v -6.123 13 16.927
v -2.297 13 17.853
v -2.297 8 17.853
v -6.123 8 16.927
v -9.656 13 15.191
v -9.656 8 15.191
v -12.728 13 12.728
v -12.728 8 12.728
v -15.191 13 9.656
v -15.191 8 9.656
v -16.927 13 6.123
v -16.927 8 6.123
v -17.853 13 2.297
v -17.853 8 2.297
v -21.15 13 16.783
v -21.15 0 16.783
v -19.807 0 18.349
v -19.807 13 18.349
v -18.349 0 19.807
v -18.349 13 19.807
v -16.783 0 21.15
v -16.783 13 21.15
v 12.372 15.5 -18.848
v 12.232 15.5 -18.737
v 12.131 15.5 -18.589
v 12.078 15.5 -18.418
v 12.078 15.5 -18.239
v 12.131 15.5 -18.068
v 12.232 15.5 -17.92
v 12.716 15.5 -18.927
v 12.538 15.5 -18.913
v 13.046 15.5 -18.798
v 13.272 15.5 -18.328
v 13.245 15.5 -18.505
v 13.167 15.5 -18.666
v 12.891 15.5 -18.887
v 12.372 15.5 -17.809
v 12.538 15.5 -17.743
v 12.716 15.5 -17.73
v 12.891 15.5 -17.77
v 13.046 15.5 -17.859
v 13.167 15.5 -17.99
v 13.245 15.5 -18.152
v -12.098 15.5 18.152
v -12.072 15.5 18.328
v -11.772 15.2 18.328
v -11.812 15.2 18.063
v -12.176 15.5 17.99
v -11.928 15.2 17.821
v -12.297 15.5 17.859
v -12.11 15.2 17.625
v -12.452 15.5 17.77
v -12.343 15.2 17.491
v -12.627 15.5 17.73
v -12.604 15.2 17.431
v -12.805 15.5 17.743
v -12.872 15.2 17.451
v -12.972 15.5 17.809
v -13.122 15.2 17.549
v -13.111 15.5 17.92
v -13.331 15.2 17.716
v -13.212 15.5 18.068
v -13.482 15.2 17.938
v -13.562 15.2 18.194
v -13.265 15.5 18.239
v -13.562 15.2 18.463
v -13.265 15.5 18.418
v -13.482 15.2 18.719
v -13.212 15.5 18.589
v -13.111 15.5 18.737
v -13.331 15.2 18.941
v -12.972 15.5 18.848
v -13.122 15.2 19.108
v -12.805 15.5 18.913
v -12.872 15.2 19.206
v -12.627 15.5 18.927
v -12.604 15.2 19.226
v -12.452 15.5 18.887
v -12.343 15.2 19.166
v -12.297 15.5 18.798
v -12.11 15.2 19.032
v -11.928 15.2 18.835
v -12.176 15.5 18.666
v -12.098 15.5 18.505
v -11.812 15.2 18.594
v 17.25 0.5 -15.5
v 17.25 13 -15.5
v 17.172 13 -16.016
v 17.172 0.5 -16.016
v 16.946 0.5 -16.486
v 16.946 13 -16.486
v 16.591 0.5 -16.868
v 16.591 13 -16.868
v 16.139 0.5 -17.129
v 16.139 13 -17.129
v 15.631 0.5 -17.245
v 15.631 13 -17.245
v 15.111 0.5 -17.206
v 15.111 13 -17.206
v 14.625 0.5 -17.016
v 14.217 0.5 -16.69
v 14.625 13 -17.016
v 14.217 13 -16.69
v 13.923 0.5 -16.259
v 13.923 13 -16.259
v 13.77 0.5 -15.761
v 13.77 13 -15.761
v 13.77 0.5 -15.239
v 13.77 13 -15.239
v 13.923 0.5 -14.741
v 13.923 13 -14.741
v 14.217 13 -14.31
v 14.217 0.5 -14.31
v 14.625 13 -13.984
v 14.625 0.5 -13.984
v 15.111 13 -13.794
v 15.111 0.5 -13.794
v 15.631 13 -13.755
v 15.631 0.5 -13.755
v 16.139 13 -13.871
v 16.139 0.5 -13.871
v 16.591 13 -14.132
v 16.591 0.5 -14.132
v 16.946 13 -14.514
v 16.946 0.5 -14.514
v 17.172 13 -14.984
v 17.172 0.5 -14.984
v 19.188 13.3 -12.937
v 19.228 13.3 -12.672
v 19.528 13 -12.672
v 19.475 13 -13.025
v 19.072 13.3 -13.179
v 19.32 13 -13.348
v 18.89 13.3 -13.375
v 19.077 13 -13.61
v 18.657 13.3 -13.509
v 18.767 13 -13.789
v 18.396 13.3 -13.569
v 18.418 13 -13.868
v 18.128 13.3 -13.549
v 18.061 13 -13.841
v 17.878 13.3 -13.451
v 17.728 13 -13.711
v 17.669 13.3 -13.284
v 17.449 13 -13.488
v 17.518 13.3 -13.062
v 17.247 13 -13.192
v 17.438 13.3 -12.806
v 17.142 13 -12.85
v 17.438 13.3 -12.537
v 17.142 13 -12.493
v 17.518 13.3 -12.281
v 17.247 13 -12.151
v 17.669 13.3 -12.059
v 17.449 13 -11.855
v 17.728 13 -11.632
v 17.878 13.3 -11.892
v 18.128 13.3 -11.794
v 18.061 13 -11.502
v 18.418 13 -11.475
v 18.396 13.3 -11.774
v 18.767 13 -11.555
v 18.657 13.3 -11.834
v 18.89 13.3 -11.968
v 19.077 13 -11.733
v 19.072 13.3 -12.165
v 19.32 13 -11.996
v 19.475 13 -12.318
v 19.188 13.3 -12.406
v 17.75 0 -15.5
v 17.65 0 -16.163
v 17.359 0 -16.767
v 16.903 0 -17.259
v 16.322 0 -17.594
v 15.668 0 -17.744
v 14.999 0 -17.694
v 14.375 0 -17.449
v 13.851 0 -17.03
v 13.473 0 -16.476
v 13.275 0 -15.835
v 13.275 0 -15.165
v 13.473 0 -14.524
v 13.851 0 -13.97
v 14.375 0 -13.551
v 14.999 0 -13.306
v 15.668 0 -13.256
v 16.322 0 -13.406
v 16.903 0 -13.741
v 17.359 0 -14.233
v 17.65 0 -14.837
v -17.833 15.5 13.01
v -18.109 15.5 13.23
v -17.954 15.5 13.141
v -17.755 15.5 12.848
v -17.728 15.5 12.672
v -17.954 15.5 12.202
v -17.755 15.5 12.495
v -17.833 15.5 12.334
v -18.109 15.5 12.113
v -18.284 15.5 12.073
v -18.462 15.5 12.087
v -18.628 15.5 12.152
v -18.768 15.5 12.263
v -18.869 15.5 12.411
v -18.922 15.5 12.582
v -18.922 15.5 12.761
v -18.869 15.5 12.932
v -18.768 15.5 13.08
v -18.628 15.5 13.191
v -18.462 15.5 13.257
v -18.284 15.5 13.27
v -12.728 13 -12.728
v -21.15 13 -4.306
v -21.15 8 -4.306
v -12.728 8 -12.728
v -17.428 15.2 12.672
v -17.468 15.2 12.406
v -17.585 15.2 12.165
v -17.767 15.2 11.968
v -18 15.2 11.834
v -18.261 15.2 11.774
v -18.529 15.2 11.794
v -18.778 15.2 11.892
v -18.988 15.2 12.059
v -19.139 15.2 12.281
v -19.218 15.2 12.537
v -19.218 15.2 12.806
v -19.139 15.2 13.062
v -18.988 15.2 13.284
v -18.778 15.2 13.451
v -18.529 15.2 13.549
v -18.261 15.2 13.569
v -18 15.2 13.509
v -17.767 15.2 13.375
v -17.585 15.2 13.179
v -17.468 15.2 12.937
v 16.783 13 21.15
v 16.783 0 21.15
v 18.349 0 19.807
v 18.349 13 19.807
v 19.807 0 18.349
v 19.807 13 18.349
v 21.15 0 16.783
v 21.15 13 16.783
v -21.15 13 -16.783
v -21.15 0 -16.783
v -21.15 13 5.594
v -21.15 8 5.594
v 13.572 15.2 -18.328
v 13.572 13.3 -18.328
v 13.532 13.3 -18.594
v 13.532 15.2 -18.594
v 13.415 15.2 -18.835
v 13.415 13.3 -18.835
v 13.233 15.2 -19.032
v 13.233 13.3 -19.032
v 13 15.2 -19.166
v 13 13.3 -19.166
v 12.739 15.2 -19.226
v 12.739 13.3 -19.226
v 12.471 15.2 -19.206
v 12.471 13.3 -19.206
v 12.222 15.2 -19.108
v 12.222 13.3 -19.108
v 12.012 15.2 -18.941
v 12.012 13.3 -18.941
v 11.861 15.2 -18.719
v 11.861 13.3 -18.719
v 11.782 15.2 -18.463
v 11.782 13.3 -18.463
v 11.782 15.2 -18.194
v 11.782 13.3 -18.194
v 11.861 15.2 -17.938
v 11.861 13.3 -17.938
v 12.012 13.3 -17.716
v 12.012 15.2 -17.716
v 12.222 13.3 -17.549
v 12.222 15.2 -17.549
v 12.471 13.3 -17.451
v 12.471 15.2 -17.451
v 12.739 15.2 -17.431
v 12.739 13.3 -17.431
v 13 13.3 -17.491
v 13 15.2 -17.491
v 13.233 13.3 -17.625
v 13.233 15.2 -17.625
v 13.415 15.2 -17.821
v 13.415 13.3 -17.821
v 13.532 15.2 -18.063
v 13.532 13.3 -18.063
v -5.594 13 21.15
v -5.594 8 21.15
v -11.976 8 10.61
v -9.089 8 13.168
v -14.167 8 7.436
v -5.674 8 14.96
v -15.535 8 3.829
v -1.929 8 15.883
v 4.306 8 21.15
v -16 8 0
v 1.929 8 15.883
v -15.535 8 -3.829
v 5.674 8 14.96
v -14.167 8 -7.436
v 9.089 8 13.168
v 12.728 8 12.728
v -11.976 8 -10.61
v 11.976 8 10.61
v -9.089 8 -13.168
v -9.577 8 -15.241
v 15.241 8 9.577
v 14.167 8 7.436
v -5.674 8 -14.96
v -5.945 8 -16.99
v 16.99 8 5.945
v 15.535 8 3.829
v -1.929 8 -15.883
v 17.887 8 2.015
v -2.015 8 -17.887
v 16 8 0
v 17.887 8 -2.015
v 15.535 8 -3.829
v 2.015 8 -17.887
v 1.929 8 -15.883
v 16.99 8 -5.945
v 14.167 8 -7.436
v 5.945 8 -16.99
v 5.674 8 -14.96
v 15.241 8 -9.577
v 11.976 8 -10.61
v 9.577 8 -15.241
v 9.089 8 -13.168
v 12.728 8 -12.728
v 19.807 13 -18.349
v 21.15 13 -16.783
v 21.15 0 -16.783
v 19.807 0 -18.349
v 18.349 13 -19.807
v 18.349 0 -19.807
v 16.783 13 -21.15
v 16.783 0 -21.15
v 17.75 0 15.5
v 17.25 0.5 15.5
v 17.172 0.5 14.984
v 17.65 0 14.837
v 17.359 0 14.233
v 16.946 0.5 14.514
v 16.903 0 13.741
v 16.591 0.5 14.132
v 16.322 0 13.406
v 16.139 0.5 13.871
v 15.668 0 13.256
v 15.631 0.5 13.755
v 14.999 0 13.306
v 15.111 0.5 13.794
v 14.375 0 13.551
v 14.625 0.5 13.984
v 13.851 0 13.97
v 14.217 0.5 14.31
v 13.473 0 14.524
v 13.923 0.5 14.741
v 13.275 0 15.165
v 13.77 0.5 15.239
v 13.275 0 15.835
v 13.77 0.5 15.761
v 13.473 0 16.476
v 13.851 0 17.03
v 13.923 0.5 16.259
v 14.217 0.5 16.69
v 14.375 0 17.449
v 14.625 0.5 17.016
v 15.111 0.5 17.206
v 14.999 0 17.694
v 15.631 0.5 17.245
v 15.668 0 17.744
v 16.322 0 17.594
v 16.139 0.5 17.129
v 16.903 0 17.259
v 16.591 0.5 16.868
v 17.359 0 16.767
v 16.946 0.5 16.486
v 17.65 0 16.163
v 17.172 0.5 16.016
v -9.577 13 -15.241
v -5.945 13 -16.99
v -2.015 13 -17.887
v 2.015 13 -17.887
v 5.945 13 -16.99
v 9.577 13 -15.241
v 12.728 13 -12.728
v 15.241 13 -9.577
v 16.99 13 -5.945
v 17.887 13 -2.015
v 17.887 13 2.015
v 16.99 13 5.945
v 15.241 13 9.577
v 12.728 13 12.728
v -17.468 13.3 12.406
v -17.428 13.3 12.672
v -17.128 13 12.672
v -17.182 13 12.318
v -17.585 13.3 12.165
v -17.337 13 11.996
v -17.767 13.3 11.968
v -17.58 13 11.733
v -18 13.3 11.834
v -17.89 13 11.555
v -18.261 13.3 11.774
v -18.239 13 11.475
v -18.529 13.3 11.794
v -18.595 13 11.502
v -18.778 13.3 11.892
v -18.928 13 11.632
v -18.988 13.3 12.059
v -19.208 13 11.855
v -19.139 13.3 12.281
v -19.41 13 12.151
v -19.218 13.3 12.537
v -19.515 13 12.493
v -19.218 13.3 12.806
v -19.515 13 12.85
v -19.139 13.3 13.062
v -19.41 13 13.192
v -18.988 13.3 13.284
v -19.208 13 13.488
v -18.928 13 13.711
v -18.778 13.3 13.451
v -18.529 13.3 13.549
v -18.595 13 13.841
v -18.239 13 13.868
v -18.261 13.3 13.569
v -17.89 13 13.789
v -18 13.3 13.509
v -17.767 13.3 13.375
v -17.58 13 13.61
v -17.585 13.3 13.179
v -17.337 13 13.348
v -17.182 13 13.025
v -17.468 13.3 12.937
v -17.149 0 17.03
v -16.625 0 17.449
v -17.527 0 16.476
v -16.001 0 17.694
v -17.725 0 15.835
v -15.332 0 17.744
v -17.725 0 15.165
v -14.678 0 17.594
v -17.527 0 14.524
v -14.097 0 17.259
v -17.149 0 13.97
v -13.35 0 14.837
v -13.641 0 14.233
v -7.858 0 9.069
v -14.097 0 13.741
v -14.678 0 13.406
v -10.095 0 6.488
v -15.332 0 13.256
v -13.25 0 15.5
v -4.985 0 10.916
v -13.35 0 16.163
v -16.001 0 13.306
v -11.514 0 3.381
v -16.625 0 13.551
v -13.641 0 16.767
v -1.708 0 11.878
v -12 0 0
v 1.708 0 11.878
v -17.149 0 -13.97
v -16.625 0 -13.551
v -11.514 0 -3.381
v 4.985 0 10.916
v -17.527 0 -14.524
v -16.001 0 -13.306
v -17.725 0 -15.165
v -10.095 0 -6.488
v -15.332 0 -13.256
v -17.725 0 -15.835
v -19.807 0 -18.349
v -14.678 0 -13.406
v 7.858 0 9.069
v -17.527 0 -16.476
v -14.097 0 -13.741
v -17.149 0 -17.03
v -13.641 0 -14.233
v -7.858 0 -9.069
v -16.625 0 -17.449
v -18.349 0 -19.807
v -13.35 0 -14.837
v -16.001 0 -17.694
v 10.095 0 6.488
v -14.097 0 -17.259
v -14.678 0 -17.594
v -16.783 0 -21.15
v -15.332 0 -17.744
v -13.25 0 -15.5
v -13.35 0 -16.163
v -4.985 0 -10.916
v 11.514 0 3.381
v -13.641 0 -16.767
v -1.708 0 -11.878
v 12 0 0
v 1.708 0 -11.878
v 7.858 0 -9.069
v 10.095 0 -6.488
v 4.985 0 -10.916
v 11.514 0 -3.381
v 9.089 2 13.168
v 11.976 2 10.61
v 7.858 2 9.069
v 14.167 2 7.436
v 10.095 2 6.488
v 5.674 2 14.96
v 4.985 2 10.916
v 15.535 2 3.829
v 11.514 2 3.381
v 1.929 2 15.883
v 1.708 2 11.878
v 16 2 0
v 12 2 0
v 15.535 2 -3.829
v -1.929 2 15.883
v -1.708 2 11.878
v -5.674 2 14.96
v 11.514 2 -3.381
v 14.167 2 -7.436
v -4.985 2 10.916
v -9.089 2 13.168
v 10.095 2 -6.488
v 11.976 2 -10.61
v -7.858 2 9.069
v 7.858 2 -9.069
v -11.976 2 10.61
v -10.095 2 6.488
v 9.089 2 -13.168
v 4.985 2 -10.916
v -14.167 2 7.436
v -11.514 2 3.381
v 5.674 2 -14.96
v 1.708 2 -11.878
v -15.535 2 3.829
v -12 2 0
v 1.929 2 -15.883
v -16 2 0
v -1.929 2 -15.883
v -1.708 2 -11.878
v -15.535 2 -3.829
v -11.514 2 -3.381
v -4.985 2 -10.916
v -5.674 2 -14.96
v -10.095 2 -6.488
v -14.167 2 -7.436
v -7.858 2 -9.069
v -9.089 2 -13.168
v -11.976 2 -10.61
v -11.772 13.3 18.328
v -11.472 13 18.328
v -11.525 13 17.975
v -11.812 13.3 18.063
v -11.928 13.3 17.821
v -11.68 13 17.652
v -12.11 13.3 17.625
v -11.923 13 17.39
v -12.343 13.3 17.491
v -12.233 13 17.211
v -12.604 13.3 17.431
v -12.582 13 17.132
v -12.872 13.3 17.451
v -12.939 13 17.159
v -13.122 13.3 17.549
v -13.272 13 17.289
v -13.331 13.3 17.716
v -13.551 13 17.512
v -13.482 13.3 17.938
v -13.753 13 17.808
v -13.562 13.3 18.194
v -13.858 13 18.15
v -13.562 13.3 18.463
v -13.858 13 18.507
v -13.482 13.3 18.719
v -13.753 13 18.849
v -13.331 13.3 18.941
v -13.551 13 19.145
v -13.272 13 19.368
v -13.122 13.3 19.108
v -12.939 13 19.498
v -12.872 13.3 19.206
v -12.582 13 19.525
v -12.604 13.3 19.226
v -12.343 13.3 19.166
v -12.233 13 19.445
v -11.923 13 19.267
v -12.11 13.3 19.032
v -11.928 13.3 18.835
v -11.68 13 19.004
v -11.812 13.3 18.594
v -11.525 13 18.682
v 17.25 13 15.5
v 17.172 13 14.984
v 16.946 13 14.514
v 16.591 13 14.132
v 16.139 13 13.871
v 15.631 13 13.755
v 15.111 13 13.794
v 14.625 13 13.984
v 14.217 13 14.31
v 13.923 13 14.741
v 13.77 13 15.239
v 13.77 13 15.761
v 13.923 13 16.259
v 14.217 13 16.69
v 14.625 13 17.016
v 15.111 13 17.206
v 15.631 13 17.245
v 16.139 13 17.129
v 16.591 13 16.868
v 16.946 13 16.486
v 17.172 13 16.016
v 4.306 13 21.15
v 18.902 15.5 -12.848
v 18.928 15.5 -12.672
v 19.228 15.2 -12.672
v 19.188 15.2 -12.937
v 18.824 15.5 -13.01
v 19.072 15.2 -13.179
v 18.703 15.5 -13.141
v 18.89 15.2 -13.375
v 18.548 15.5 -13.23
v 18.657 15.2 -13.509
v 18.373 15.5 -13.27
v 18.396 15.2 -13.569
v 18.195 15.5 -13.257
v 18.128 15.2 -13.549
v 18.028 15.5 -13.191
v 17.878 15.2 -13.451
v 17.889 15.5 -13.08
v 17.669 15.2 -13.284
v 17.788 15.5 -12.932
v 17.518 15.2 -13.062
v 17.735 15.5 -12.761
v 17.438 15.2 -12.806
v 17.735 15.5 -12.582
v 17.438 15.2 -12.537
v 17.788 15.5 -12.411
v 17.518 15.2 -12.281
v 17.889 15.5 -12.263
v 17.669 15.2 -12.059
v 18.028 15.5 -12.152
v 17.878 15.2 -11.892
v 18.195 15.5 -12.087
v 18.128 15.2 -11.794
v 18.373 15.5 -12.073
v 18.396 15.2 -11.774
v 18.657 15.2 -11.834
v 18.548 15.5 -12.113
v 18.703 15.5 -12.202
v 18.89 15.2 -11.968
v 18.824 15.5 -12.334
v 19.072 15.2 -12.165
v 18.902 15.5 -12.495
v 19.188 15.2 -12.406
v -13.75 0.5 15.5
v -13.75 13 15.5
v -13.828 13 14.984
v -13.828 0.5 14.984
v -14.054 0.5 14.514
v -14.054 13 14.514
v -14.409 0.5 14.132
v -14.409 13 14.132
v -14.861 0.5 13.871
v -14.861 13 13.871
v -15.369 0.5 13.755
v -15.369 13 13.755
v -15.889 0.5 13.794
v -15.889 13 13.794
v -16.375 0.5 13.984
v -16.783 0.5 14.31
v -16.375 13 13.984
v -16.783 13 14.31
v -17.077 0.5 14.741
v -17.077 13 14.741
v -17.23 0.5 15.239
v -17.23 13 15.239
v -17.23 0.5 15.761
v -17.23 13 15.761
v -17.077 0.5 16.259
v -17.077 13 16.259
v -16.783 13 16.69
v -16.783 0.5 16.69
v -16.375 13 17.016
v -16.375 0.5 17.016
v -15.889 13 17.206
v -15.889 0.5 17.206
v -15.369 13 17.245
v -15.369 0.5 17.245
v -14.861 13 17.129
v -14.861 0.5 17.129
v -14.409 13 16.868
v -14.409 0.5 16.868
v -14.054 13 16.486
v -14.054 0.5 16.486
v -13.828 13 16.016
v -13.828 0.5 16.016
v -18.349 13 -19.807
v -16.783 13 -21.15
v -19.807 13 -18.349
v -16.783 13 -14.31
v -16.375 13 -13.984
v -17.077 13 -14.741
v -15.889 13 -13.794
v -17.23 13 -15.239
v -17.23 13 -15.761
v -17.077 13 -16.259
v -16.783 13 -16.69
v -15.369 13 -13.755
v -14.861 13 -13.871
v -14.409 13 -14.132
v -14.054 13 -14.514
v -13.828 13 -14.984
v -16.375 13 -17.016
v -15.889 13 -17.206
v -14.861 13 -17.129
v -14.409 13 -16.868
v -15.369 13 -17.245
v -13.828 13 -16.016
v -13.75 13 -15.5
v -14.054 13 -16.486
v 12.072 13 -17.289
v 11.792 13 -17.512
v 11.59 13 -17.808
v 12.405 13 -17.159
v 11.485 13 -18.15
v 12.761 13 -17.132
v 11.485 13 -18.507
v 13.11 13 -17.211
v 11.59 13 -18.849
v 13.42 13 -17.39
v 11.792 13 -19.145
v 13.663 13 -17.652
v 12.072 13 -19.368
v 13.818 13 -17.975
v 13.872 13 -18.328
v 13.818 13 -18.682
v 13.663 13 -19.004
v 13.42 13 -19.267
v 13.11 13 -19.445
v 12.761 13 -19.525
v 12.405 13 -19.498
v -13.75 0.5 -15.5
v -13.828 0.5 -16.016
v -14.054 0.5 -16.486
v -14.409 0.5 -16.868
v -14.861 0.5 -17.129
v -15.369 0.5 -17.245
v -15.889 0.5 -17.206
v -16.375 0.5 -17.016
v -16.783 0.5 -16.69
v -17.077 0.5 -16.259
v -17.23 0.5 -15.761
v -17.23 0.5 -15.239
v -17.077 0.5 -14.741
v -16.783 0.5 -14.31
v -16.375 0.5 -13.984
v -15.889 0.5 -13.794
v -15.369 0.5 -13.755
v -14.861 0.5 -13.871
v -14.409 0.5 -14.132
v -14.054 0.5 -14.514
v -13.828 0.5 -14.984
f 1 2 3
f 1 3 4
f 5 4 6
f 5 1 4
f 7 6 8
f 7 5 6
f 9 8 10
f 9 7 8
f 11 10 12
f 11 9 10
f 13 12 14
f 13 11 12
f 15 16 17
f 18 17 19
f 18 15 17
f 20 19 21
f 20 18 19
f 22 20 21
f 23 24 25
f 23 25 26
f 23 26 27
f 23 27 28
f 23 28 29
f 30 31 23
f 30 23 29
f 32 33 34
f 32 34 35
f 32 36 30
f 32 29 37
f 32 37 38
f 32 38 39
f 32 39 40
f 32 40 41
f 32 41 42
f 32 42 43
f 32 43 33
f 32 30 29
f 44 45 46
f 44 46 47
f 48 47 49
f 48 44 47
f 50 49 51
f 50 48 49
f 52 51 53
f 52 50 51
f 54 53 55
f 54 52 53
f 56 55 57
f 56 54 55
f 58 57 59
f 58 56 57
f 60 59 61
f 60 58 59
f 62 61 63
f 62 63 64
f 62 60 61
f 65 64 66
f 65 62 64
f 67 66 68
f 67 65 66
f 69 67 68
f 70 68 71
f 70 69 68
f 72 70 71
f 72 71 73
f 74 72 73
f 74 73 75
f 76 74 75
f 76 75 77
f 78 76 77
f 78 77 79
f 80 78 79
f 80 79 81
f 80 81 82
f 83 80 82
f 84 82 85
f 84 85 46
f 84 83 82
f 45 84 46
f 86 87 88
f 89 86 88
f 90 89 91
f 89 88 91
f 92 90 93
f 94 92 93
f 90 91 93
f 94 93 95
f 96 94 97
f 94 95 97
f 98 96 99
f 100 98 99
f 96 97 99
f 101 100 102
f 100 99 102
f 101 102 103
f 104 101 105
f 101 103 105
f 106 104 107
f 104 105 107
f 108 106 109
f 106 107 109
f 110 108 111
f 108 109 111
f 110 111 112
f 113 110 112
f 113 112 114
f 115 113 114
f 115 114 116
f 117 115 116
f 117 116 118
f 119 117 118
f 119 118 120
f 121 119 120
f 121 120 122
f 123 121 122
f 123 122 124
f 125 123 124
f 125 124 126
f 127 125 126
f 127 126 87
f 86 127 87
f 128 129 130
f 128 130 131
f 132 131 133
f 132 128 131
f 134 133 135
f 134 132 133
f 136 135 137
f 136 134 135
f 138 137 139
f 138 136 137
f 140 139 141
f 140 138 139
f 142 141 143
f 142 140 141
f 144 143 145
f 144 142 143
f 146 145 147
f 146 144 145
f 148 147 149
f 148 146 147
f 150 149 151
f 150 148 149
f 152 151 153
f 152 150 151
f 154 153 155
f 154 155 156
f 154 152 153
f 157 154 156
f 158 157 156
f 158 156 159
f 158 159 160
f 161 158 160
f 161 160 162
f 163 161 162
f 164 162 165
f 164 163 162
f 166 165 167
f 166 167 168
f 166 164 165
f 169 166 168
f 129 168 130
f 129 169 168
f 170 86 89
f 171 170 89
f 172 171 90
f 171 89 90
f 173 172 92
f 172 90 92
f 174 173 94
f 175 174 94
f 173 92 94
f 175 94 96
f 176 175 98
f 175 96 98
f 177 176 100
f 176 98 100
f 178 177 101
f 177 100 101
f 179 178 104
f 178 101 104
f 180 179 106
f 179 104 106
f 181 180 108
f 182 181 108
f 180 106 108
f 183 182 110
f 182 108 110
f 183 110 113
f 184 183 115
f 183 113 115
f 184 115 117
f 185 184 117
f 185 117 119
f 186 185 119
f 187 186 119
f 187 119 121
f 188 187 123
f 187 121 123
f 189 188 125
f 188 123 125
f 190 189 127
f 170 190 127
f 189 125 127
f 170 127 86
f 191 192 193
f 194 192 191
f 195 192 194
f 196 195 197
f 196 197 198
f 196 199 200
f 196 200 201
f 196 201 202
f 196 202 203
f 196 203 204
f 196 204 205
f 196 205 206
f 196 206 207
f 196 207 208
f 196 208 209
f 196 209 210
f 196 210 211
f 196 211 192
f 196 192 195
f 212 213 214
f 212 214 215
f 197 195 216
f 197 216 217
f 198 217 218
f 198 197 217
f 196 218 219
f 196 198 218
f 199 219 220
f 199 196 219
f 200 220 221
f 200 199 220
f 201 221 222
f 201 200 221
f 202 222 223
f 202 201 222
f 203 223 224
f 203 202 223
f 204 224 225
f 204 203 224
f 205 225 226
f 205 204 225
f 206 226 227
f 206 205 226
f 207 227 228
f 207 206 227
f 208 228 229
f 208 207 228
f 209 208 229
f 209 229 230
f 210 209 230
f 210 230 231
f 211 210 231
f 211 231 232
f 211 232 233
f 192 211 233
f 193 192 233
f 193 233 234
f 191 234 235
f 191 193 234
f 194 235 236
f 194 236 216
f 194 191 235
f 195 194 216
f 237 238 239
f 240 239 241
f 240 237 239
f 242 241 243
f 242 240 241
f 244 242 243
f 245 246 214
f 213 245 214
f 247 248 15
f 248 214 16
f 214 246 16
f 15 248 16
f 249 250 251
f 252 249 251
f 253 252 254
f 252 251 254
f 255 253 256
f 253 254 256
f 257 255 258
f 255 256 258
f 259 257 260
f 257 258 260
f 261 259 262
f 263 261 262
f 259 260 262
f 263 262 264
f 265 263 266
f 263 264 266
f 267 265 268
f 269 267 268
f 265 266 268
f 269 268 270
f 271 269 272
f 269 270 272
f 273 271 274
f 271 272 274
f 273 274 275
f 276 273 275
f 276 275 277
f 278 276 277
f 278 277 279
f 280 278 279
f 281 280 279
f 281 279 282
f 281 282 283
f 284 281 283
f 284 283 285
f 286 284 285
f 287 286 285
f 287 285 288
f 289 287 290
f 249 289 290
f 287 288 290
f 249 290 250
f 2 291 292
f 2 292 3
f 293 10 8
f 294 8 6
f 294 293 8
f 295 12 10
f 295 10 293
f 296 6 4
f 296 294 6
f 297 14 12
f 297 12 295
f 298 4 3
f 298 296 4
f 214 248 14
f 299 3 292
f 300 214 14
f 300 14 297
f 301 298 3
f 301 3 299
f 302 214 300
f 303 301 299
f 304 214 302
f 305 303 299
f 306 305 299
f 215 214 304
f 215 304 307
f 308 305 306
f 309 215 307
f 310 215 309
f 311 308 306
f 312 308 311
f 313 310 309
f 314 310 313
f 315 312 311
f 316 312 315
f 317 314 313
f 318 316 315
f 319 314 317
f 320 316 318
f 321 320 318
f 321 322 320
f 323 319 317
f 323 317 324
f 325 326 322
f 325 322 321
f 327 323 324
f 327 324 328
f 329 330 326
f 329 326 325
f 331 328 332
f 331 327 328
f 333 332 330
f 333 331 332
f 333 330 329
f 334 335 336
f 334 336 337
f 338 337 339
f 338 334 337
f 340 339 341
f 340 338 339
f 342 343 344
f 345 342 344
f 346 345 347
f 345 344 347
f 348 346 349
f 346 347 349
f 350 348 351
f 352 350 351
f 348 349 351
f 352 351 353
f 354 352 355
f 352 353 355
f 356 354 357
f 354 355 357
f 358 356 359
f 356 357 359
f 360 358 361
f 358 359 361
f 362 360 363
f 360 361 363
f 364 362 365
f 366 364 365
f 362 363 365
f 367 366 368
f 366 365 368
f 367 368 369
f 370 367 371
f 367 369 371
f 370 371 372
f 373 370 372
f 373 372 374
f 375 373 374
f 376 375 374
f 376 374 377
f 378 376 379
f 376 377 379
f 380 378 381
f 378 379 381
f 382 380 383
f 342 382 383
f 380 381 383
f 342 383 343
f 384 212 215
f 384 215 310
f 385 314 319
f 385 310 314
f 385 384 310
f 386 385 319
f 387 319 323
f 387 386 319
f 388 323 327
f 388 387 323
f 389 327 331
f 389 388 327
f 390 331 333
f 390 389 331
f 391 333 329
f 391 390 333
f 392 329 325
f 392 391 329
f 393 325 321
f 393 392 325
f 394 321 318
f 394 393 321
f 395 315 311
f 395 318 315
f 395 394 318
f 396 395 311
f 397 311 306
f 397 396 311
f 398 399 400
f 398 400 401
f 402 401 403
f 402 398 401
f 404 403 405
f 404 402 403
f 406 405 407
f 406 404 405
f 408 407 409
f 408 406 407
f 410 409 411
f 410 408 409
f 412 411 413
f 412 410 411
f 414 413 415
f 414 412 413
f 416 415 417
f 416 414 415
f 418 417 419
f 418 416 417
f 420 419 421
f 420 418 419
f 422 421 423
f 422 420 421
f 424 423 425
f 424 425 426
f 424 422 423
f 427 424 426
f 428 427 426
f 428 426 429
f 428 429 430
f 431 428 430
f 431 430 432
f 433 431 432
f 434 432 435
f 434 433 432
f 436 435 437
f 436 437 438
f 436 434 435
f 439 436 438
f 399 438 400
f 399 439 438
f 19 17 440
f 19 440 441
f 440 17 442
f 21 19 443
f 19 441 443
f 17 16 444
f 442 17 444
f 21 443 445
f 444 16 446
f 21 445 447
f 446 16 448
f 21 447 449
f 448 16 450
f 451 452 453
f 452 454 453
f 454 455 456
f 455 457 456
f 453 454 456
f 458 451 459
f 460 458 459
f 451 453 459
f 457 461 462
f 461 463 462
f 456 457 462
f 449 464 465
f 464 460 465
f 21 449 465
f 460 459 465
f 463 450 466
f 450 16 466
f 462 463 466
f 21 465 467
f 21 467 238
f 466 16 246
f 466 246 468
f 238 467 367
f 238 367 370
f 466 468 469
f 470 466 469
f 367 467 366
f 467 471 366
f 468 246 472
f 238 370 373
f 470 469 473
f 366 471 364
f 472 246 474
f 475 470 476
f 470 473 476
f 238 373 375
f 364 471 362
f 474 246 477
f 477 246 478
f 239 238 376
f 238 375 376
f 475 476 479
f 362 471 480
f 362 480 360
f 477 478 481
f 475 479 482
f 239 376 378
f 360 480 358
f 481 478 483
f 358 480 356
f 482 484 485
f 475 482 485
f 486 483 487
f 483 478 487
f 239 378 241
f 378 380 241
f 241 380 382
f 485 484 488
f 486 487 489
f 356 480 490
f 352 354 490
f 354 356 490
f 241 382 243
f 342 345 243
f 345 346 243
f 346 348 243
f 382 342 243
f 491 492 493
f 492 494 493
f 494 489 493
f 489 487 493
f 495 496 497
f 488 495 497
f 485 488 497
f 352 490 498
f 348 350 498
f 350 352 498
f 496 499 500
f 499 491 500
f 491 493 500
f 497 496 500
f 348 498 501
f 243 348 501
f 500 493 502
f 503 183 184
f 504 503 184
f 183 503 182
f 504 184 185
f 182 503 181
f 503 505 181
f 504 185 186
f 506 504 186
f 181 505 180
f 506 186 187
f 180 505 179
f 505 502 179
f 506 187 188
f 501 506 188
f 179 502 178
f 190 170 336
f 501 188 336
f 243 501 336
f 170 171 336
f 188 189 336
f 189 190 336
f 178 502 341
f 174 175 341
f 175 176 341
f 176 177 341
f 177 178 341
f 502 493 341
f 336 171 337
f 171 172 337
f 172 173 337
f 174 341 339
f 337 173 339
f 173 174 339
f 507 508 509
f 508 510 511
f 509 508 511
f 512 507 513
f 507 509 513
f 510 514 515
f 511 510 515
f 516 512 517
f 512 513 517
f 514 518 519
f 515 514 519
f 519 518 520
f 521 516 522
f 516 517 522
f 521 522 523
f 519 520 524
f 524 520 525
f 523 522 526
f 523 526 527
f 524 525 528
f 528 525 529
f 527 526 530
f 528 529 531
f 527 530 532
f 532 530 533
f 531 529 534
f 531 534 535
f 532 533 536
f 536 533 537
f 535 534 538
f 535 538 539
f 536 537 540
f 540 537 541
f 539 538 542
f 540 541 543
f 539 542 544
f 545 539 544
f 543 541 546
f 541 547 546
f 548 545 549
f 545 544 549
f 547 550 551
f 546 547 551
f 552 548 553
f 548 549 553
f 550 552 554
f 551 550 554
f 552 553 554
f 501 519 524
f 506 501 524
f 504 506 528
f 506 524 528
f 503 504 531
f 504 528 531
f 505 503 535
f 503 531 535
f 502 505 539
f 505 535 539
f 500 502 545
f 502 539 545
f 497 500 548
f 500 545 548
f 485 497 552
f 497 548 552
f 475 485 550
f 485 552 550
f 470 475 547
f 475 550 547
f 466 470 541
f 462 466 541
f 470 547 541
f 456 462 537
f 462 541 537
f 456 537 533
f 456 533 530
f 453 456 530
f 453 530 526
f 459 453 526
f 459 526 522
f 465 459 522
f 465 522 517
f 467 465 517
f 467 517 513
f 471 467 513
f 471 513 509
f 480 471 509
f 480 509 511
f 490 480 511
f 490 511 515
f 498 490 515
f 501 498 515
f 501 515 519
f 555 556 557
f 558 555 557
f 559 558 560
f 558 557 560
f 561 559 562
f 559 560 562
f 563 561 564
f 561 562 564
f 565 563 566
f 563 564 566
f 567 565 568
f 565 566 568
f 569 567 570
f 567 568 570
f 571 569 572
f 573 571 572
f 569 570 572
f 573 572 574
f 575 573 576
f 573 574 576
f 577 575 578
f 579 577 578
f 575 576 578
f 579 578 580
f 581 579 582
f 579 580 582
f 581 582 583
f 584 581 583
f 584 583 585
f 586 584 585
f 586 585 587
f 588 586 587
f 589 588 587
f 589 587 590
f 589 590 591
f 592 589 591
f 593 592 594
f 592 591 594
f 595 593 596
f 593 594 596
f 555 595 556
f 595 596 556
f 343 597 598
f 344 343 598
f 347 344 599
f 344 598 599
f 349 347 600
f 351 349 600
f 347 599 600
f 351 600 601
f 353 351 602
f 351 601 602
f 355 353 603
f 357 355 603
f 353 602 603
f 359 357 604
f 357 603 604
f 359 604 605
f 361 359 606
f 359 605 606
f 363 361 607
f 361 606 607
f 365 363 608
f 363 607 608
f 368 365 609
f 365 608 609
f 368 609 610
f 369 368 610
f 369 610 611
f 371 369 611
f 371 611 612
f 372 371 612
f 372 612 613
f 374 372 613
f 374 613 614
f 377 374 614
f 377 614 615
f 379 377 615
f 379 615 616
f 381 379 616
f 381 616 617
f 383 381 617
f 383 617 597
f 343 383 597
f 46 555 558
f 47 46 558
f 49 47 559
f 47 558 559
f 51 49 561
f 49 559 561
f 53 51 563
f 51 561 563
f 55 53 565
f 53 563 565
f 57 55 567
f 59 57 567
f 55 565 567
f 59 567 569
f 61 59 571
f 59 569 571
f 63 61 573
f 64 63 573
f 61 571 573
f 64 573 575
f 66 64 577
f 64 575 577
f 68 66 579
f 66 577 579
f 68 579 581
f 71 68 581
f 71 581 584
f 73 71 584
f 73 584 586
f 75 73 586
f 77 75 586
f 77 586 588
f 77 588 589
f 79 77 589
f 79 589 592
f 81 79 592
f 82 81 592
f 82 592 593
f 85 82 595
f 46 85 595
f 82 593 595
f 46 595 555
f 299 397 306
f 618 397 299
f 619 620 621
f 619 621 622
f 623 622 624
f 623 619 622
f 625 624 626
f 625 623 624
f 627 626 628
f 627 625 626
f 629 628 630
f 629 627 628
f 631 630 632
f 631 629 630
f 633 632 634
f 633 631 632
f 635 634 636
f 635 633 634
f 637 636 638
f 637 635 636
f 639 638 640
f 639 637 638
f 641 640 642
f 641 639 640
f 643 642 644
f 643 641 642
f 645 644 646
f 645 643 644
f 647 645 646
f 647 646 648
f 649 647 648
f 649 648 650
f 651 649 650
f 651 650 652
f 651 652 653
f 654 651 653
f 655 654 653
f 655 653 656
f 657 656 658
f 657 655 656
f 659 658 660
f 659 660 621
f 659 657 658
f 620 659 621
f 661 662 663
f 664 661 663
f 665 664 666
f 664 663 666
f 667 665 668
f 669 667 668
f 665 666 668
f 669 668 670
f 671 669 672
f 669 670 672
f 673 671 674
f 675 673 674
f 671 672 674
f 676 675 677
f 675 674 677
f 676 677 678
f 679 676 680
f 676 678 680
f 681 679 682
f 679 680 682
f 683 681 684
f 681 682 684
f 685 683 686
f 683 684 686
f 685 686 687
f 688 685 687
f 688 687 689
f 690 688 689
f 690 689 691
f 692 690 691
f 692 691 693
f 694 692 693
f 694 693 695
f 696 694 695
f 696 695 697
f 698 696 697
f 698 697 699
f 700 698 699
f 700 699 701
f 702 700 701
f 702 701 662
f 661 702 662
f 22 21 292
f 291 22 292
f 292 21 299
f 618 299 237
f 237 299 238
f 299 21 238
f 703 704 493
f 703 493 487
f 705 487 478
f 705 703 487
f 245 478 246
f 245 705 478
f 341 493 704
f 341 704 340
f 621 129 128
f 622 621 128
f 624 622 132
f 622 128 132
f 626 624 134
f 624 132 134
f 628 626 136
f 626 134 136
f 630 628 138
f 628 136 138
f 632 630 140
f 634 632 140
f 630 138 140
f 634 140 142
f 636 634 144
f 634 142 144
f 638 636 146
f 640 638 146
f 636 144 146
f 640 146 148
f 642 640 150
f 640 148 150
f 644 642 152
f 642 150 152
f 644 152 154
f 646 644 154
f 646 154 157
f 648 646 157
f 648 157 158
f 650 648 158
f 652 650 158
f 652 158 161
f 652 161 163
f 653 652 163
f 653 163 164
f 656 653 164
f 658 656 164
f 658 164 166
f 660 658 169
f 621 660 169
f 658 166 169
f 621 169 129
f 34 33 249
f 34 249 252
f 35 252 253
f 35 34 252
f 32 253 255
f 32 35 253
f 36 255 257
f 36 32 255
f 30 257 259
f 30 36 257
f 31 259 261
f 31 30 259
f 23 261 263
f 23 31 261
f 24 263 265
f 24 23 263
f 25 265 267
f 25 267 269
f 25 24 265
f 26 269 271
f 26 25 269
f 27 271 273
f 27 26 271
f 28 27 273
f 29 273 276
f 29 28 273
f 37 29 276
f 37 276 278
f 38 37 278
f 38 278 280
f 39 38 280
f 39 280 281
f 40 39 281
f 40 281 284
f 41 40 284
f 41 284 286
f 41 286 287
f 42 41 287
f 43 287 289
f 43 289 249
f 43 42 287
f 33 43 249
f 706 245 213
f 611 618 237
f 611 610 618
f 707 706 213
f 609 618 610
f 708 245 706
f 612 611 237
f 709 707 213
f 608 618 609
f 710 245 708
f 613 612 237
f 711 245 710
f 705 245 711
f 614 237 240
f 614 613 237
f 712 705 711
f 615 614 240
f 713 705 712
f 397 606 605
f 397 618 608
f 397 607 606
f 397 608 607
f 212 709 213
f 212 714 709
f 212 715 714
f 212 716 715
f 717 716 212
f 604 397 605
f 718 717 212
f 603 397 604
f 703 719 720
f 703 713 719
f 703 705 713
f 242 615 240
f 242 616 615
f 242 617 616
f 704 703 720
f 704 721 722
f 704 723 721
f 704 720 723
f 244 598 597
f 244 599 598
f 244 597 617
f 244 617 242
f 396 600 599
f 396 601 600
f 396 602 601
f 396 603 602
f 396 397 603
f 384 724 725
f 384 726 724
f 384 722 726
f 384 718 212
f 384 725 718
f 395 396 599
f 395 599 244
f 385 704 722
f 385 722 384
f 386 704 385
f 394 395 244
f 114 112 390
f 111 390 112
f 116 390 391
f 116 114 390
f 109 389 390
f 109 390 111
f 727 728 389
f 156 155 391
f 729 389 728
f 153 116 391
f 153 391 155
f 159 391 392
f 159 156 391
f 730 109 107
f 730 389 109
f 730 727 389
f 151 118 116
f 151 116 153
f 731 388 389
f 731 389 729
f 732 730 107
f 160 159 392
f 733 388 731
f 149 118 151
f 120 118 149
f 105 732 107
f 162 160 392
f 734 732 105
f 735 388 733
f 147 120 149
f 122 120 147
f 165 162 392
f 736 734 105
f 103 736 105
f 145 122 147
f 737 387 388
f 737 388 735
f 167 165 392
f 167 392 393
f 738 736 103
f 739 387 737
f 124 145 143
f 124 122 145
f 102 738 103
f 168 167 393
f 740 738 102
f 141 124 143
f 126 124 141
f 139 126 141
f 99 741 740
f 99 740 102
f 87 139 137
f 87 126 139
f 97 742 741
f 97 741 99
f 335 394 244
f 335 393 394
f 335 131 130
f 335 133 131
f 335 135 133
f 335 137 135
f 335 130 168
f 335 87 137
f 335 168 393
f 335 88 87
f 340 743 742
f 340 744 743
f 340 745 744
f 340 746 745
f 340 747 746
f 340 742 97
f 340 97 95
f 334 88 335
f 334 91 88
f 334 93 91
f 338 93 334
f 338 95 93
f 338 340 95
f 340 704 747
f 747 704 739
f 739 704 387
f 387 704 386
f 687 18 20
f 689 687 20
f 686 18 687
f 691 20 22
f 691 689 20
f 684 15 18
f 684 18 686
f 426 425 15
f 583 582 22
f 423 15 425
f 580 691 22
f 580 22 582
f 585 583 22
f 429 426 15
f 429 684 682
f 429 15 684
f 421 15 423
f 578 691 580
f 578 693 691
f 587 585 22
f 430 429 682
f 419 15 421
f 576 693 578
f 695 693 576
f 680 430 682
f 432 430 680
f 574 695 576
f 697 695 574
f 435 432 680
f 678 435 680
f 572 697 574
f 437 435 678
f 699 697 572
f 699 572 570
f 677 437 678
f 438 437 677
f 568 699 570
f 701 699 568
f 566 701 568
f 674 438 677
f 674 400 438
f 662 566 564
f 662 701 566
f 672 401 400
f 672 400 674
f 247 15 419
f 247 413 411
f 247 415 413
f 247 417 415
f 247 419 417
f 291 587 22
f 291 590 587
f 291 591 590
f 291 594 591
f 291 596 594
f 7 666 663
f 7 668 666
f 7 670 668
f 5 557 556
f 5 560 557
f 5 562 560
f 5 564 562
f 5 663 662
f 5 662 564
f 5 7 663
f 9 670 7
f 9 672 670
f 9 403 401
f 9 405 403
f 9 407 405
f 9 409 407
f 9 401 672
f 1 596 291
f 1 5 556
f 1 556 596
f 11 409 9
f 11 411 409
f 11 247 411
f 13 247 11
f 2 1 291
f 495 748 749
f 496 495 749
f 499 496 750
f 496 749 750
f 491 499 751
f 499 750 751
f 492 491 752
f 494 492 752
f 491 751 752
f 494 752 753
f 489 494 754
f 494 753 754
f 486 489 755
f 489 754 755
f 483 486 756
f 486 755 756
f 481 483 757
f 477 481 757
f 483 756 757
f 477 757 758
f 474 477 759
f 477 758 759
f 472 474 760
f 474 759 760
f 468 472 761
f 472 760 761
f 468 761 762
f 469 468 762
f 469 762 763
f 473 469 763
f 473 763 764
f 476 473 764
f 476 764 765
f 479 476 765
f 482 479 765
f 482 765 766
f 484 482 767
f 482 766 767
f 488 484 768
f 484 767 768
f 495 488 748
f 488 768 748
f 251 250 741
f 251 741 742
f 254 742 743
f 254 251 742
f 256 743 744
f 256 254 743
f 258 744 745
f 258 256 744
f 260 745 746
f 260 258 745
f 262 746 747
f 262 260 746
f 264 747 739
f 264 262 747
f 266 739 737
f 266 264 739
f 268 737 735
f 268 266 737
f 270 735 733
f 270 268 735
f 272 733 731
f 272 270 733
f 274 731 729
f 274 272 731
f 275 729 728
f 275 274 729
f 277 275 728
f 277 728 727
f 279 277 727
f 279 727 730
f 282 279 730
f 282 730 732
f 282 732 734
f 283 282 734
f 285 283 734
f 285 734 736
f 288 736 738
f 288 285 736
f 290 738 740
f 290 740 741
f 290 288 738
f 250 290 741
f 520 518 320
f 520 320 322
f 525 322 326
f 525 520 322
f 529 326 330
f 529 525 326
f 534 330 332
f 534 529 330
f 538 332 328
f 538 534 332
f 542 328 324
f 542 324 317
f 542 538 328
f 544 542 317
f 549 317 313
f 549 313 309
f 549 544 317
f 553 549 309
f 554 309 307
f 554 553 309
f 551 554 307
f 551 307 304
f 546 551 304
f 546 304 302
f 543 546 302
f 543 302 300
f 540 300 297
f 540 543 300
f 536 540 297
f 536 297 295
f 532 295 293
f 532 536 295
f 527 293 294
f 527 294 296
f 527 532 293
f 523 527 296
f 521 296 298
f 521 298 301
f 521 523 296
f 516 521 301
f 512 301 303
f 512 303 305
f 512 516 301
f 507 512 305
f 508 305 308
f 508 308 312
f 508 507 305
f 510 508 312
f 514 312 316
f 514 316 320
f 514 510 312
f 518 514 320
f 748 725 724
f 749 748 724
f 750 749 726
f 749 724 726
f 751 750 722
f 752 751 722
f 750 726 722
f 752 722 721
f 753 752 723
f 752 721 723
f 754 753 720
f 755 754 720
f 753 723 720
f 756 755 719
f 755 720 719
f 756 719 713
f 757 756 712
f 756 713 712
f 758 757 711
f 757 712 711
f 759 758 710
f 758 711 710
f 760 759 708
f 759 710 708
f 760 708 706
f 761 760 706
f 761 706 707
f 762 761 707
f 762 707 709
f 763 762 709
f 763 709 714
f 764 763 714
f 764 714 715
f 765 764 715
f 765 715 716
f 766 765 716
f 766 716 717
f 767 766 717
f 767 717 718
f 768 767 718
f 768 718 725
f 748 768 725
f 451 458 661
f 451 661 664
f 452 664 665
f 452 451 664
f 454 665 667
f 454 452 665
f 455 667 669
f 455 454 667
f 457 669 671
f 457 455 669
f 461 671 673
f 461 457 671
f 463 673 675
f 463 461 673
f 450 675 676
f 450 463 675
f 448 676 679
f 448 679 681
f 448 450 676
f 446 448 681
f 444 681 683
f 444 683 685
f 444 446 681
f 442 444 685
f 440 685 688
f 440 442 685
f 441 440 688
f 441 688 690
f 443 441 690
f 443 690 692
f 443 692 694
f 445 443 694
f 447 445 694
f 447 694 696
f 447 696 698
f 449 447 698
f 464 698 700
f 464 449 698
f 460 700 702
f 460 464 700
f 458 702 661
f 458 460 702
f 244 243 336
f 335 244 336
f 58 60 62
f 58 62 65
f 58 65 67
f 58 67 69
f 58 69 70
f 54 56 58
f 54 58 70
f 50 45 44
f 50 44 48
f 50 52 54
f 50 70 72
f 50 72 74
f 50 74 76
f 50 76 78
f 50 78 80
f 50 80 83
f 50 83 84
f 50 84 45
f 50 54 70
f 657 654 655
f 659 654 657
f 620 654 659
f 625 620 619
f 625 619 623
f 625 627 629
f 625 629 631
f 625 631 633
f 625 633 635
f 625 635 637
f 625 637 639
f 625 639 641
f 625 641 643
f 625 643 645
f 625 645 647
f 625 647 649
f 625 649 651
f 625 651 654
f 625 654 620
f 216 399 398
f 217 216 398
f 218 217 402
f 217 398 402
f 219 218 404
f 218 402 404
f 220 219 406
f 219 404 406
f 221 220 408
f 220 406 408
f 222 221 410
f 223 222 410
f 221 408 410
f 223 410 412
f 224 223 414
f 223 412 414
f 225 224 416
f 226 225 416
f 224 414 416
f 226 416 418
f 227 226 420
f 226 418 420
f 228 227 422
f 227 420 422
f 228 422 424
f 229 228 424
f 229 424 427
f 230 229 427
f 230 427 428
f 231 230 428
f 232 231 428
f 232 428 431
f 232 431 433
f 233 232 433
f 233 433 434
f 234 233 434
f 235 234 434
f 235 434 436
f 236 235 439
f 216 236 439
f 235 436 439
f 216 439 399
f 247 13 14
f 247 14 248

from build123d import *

# Parameters (mm, degrees)
SKETCH2_W           = 42.3
SKETCH2_H           = 42.3
BOSS_EXTRUDE1_DEPTH = 13
SKETCH3_R           = 11
CUT_EXTRUDE1_DEPTH  = 14
SKETCH4_R           = 1.75
CUT_EXTRUDE2_DEPTH  = 14
SKETCH5_R           = 29.910616844
SKETCH5_R_2         = 27
CUT_EXTRUDE4_DEPTH  = 14
CUT_EXTRUDE5_DEPTH  = 11
SKETCH7_R           = 16
BOSS_EXTRUDE2_DEPTH = 6
SKETCH8_R           = 0.9
BOSS_EXTRUDE3_DEPTH = 2.5
CHAMFER1_SIZE       = 0.3
CHAMFER2_SIZE       = 0.3
SKETCH9_R           = 12
CUT_EXTRUDE6_DEPTH  = 3
CHAMFER4_SIZE       = 0.5


with BuildPart() as part:
    # Sketch2 → Boss-Extrude1 (new body)
    with BuildSketch(Plane(origin=(0, 0, 0), x_dir=(1, 0, 0), z_dir=(0, 1, 0))):
        Rectangle(SKETCH2_W, SKETCH2_H)
    extrude(amount=BOSS_EXTRUDE1_DEPTH)

    # Sketch3 → Cut-Extrude1 (cut, through all)
    with BuildSketch(Plane(origin=(0, 13, 0), x_dir=(1, 0, 0), z_dir=(0, 1, 0))):
        Circle(SKETCH3_R)
    extrude(amount=-CUT_EXTRUDE1_DEPTH, mode=Mode.SUBTRACT)

    # Sketch4 → Cut-Extrude2 (cut, through all)
    with BuildSketch(Plane(origin=(0, 13, 0), x_dir=(1, 0, 0), z_dir=(0, 1, 0))):
        with Locations((-15.5, 15.5)):
            Circle(SKETCH4_R)
        with Locations((15.5, 15.5)):
            Circle(SKETCH4_R)
        with Locations((15.5, -15.5)):
            Circle(SKETCH4_R)
        with Locations((-15.5, -15.5)):
            Circle(SKETCH4_R)
    extrude(amount=-CUT_EXTRUDE2_DEPTH, mode=Mode.SUBTRACT)

    # Sketch5 → Cut-Extrude4 (cut, through all)
    with BuildSketch(Plane(origin=(0, 13, 0), x_dir=(1, 0, 0), z_dir=(0, 1, 0))):
        Circle(SKETCH5_R)
        Circle(SKETCH5_R_2, mode=Mode.SUBTRACT)
    extrude(amount=-CUT_EXTRUDE4_DEPTH, mode=Mode.SUBTRACT)

    # Sketch6 → Cut-Extrude5 (cut)
    with BuildSketch(Plane(origin=(0, 13, 0), x_dir=(1, 0, 0), z_dir=(0, 1, 0))):
        with BuildLine():
            Line((-21.15, 4.305844123), (-12.727922061, 12.727922061))
            ThreePointArc((-12.727922061, 12.727922061), (12.727922061, 12.727922061), (12.727922061, -12.727922061))
            Line((12.727922061, -12.727922061), (4.305844123, -21.15))
            Line((4.305844123, -21.15), (-5.593650814, -21.15))
            Line((-5.593650814, -21.15), (-2.296546247, -17.852895433))
            ThreePointArc((-2.296546247, -17.852895433), (-12.727922061, -12.727922061), (-17.852895433, -2.296546247))
            Line((-17.852895433, -2.296546247), (-21.15, -5.593650814))
            Line((-21.15, -5.593650814), (-21.15, 4.305844123))
        make_face()
    extrude(amount=-CUT_EXTRUDE5_DEPTH, mode=Mode.SUBTRACT)

    # Sketch7 → Boss-Extrude2 (add)
    with BuildSketch(Plane(origin=(0, 2, 0), x_dir=(1, 0, 0), z_dir=(0, 1, 0))):
        with BuildLine():
            Line((-21.15, 4.305844123), (-21.15, -5.593650814))
            Line((-21.15, -5.593650814), (-17.852895433, -2.296546247))
            ThreePointArc((-17.852895433, -2.296546247), (-12.727922061, -12.727922061), (-2.296546247, -17.852895433))
            Line((-2.296546247, -17.852895433), (-5.593650814, -21.15))
            Line((-5.593650814, -21.15), (4.305844123, -21.15))
            Line((4.305844123, -21.15), (12.727922061, -12.727922061))
            ThreePointArc((12.727922061, -12.727922061), (12.727922061, 12.727922061), (-12.727922061, 12.727922061))
            Line((-12.727922061, 12.727922061), (-21.15, 4.305844123))
        make_face()
        Circle(SKETCH7_R, mode=Mode.SUBTRACT)
    extrude(amount=BOSS_EXTRUDE2_DEPTH)

    # Sketch8 → Boss-Extrude3 (add)
    with BuildSketch(Plane(origin=(0, 13, 0), x_dir=(1, 0, 0), z_dir=(0, 1, 0))):
        with Locations((12.671572875, 18.328427125)):
            Circle(SKETCH8_R)
        with Locations((18.328427125, 12.671572875)):
            Circle(SKETCH8_R)
        with Locations((-12.671572875, -18.328427125)):
            Circle(SKETCH8_R)
        with Locations((-18.328427125, -12.671572875)):
            Circle(SKETCH8_R)
    extrude(amount=BOSS_EXTRUDE3_DEPTH)

    # Chamfer1
    chamfer1_edges = [part.edges().sort_by_distance(p)[0] for p in [
        (11.771572875, 15.5, -18.328427125),
        (17.428427125, 15.5, -12.671572875),
        (-13.571572875, 15.5, 18.328427125),
        (-19.228427125, 15.5, 12.671572875),
    ]]
    chamfer(chamfer1_edges, length=CHAMFER1_SIZE)

    # Chamfer2
    chamfer2_edges = [part.edges().sort_by_distance(p)[0] for p in [
        (11.771572875, 13, -18.328427125),
        (17.428427125, 13, -12.671572875),
        (-13.571572875, 13, 18.328427125),
        (-19.228427125, 13, 12.671572875),
    ]]
    chamfer(chamfer2_edges, length=CHAMFER2_SIZE)

    # Sketch9 → Cut-Extrude6 (cut, through all)
    with BuildSketch(Plane(origin=(0, 2, 0), x_dir=(1, 0, 0), z_dir=(0, 1, 0))):
        Circle(SKETCH9_R)
    extrude(amount=-CUT_EXTRUDE6_DEPTH, mode=Mode.SUBTRACT)

    # Chamfer4
    chamfer4_edges = [part.edges().sort_by_distance(p)[0] for p in [
        (-17.25, 0, 15.5),
        (13.75, 0, 15.5),
        (13.75, 0, -15.5),
        (-17.25, 0, -15.5),
    ]]
    chamfer(chamfer4_edges, length=CHAMFER4_SIZE)


solid = part.part
